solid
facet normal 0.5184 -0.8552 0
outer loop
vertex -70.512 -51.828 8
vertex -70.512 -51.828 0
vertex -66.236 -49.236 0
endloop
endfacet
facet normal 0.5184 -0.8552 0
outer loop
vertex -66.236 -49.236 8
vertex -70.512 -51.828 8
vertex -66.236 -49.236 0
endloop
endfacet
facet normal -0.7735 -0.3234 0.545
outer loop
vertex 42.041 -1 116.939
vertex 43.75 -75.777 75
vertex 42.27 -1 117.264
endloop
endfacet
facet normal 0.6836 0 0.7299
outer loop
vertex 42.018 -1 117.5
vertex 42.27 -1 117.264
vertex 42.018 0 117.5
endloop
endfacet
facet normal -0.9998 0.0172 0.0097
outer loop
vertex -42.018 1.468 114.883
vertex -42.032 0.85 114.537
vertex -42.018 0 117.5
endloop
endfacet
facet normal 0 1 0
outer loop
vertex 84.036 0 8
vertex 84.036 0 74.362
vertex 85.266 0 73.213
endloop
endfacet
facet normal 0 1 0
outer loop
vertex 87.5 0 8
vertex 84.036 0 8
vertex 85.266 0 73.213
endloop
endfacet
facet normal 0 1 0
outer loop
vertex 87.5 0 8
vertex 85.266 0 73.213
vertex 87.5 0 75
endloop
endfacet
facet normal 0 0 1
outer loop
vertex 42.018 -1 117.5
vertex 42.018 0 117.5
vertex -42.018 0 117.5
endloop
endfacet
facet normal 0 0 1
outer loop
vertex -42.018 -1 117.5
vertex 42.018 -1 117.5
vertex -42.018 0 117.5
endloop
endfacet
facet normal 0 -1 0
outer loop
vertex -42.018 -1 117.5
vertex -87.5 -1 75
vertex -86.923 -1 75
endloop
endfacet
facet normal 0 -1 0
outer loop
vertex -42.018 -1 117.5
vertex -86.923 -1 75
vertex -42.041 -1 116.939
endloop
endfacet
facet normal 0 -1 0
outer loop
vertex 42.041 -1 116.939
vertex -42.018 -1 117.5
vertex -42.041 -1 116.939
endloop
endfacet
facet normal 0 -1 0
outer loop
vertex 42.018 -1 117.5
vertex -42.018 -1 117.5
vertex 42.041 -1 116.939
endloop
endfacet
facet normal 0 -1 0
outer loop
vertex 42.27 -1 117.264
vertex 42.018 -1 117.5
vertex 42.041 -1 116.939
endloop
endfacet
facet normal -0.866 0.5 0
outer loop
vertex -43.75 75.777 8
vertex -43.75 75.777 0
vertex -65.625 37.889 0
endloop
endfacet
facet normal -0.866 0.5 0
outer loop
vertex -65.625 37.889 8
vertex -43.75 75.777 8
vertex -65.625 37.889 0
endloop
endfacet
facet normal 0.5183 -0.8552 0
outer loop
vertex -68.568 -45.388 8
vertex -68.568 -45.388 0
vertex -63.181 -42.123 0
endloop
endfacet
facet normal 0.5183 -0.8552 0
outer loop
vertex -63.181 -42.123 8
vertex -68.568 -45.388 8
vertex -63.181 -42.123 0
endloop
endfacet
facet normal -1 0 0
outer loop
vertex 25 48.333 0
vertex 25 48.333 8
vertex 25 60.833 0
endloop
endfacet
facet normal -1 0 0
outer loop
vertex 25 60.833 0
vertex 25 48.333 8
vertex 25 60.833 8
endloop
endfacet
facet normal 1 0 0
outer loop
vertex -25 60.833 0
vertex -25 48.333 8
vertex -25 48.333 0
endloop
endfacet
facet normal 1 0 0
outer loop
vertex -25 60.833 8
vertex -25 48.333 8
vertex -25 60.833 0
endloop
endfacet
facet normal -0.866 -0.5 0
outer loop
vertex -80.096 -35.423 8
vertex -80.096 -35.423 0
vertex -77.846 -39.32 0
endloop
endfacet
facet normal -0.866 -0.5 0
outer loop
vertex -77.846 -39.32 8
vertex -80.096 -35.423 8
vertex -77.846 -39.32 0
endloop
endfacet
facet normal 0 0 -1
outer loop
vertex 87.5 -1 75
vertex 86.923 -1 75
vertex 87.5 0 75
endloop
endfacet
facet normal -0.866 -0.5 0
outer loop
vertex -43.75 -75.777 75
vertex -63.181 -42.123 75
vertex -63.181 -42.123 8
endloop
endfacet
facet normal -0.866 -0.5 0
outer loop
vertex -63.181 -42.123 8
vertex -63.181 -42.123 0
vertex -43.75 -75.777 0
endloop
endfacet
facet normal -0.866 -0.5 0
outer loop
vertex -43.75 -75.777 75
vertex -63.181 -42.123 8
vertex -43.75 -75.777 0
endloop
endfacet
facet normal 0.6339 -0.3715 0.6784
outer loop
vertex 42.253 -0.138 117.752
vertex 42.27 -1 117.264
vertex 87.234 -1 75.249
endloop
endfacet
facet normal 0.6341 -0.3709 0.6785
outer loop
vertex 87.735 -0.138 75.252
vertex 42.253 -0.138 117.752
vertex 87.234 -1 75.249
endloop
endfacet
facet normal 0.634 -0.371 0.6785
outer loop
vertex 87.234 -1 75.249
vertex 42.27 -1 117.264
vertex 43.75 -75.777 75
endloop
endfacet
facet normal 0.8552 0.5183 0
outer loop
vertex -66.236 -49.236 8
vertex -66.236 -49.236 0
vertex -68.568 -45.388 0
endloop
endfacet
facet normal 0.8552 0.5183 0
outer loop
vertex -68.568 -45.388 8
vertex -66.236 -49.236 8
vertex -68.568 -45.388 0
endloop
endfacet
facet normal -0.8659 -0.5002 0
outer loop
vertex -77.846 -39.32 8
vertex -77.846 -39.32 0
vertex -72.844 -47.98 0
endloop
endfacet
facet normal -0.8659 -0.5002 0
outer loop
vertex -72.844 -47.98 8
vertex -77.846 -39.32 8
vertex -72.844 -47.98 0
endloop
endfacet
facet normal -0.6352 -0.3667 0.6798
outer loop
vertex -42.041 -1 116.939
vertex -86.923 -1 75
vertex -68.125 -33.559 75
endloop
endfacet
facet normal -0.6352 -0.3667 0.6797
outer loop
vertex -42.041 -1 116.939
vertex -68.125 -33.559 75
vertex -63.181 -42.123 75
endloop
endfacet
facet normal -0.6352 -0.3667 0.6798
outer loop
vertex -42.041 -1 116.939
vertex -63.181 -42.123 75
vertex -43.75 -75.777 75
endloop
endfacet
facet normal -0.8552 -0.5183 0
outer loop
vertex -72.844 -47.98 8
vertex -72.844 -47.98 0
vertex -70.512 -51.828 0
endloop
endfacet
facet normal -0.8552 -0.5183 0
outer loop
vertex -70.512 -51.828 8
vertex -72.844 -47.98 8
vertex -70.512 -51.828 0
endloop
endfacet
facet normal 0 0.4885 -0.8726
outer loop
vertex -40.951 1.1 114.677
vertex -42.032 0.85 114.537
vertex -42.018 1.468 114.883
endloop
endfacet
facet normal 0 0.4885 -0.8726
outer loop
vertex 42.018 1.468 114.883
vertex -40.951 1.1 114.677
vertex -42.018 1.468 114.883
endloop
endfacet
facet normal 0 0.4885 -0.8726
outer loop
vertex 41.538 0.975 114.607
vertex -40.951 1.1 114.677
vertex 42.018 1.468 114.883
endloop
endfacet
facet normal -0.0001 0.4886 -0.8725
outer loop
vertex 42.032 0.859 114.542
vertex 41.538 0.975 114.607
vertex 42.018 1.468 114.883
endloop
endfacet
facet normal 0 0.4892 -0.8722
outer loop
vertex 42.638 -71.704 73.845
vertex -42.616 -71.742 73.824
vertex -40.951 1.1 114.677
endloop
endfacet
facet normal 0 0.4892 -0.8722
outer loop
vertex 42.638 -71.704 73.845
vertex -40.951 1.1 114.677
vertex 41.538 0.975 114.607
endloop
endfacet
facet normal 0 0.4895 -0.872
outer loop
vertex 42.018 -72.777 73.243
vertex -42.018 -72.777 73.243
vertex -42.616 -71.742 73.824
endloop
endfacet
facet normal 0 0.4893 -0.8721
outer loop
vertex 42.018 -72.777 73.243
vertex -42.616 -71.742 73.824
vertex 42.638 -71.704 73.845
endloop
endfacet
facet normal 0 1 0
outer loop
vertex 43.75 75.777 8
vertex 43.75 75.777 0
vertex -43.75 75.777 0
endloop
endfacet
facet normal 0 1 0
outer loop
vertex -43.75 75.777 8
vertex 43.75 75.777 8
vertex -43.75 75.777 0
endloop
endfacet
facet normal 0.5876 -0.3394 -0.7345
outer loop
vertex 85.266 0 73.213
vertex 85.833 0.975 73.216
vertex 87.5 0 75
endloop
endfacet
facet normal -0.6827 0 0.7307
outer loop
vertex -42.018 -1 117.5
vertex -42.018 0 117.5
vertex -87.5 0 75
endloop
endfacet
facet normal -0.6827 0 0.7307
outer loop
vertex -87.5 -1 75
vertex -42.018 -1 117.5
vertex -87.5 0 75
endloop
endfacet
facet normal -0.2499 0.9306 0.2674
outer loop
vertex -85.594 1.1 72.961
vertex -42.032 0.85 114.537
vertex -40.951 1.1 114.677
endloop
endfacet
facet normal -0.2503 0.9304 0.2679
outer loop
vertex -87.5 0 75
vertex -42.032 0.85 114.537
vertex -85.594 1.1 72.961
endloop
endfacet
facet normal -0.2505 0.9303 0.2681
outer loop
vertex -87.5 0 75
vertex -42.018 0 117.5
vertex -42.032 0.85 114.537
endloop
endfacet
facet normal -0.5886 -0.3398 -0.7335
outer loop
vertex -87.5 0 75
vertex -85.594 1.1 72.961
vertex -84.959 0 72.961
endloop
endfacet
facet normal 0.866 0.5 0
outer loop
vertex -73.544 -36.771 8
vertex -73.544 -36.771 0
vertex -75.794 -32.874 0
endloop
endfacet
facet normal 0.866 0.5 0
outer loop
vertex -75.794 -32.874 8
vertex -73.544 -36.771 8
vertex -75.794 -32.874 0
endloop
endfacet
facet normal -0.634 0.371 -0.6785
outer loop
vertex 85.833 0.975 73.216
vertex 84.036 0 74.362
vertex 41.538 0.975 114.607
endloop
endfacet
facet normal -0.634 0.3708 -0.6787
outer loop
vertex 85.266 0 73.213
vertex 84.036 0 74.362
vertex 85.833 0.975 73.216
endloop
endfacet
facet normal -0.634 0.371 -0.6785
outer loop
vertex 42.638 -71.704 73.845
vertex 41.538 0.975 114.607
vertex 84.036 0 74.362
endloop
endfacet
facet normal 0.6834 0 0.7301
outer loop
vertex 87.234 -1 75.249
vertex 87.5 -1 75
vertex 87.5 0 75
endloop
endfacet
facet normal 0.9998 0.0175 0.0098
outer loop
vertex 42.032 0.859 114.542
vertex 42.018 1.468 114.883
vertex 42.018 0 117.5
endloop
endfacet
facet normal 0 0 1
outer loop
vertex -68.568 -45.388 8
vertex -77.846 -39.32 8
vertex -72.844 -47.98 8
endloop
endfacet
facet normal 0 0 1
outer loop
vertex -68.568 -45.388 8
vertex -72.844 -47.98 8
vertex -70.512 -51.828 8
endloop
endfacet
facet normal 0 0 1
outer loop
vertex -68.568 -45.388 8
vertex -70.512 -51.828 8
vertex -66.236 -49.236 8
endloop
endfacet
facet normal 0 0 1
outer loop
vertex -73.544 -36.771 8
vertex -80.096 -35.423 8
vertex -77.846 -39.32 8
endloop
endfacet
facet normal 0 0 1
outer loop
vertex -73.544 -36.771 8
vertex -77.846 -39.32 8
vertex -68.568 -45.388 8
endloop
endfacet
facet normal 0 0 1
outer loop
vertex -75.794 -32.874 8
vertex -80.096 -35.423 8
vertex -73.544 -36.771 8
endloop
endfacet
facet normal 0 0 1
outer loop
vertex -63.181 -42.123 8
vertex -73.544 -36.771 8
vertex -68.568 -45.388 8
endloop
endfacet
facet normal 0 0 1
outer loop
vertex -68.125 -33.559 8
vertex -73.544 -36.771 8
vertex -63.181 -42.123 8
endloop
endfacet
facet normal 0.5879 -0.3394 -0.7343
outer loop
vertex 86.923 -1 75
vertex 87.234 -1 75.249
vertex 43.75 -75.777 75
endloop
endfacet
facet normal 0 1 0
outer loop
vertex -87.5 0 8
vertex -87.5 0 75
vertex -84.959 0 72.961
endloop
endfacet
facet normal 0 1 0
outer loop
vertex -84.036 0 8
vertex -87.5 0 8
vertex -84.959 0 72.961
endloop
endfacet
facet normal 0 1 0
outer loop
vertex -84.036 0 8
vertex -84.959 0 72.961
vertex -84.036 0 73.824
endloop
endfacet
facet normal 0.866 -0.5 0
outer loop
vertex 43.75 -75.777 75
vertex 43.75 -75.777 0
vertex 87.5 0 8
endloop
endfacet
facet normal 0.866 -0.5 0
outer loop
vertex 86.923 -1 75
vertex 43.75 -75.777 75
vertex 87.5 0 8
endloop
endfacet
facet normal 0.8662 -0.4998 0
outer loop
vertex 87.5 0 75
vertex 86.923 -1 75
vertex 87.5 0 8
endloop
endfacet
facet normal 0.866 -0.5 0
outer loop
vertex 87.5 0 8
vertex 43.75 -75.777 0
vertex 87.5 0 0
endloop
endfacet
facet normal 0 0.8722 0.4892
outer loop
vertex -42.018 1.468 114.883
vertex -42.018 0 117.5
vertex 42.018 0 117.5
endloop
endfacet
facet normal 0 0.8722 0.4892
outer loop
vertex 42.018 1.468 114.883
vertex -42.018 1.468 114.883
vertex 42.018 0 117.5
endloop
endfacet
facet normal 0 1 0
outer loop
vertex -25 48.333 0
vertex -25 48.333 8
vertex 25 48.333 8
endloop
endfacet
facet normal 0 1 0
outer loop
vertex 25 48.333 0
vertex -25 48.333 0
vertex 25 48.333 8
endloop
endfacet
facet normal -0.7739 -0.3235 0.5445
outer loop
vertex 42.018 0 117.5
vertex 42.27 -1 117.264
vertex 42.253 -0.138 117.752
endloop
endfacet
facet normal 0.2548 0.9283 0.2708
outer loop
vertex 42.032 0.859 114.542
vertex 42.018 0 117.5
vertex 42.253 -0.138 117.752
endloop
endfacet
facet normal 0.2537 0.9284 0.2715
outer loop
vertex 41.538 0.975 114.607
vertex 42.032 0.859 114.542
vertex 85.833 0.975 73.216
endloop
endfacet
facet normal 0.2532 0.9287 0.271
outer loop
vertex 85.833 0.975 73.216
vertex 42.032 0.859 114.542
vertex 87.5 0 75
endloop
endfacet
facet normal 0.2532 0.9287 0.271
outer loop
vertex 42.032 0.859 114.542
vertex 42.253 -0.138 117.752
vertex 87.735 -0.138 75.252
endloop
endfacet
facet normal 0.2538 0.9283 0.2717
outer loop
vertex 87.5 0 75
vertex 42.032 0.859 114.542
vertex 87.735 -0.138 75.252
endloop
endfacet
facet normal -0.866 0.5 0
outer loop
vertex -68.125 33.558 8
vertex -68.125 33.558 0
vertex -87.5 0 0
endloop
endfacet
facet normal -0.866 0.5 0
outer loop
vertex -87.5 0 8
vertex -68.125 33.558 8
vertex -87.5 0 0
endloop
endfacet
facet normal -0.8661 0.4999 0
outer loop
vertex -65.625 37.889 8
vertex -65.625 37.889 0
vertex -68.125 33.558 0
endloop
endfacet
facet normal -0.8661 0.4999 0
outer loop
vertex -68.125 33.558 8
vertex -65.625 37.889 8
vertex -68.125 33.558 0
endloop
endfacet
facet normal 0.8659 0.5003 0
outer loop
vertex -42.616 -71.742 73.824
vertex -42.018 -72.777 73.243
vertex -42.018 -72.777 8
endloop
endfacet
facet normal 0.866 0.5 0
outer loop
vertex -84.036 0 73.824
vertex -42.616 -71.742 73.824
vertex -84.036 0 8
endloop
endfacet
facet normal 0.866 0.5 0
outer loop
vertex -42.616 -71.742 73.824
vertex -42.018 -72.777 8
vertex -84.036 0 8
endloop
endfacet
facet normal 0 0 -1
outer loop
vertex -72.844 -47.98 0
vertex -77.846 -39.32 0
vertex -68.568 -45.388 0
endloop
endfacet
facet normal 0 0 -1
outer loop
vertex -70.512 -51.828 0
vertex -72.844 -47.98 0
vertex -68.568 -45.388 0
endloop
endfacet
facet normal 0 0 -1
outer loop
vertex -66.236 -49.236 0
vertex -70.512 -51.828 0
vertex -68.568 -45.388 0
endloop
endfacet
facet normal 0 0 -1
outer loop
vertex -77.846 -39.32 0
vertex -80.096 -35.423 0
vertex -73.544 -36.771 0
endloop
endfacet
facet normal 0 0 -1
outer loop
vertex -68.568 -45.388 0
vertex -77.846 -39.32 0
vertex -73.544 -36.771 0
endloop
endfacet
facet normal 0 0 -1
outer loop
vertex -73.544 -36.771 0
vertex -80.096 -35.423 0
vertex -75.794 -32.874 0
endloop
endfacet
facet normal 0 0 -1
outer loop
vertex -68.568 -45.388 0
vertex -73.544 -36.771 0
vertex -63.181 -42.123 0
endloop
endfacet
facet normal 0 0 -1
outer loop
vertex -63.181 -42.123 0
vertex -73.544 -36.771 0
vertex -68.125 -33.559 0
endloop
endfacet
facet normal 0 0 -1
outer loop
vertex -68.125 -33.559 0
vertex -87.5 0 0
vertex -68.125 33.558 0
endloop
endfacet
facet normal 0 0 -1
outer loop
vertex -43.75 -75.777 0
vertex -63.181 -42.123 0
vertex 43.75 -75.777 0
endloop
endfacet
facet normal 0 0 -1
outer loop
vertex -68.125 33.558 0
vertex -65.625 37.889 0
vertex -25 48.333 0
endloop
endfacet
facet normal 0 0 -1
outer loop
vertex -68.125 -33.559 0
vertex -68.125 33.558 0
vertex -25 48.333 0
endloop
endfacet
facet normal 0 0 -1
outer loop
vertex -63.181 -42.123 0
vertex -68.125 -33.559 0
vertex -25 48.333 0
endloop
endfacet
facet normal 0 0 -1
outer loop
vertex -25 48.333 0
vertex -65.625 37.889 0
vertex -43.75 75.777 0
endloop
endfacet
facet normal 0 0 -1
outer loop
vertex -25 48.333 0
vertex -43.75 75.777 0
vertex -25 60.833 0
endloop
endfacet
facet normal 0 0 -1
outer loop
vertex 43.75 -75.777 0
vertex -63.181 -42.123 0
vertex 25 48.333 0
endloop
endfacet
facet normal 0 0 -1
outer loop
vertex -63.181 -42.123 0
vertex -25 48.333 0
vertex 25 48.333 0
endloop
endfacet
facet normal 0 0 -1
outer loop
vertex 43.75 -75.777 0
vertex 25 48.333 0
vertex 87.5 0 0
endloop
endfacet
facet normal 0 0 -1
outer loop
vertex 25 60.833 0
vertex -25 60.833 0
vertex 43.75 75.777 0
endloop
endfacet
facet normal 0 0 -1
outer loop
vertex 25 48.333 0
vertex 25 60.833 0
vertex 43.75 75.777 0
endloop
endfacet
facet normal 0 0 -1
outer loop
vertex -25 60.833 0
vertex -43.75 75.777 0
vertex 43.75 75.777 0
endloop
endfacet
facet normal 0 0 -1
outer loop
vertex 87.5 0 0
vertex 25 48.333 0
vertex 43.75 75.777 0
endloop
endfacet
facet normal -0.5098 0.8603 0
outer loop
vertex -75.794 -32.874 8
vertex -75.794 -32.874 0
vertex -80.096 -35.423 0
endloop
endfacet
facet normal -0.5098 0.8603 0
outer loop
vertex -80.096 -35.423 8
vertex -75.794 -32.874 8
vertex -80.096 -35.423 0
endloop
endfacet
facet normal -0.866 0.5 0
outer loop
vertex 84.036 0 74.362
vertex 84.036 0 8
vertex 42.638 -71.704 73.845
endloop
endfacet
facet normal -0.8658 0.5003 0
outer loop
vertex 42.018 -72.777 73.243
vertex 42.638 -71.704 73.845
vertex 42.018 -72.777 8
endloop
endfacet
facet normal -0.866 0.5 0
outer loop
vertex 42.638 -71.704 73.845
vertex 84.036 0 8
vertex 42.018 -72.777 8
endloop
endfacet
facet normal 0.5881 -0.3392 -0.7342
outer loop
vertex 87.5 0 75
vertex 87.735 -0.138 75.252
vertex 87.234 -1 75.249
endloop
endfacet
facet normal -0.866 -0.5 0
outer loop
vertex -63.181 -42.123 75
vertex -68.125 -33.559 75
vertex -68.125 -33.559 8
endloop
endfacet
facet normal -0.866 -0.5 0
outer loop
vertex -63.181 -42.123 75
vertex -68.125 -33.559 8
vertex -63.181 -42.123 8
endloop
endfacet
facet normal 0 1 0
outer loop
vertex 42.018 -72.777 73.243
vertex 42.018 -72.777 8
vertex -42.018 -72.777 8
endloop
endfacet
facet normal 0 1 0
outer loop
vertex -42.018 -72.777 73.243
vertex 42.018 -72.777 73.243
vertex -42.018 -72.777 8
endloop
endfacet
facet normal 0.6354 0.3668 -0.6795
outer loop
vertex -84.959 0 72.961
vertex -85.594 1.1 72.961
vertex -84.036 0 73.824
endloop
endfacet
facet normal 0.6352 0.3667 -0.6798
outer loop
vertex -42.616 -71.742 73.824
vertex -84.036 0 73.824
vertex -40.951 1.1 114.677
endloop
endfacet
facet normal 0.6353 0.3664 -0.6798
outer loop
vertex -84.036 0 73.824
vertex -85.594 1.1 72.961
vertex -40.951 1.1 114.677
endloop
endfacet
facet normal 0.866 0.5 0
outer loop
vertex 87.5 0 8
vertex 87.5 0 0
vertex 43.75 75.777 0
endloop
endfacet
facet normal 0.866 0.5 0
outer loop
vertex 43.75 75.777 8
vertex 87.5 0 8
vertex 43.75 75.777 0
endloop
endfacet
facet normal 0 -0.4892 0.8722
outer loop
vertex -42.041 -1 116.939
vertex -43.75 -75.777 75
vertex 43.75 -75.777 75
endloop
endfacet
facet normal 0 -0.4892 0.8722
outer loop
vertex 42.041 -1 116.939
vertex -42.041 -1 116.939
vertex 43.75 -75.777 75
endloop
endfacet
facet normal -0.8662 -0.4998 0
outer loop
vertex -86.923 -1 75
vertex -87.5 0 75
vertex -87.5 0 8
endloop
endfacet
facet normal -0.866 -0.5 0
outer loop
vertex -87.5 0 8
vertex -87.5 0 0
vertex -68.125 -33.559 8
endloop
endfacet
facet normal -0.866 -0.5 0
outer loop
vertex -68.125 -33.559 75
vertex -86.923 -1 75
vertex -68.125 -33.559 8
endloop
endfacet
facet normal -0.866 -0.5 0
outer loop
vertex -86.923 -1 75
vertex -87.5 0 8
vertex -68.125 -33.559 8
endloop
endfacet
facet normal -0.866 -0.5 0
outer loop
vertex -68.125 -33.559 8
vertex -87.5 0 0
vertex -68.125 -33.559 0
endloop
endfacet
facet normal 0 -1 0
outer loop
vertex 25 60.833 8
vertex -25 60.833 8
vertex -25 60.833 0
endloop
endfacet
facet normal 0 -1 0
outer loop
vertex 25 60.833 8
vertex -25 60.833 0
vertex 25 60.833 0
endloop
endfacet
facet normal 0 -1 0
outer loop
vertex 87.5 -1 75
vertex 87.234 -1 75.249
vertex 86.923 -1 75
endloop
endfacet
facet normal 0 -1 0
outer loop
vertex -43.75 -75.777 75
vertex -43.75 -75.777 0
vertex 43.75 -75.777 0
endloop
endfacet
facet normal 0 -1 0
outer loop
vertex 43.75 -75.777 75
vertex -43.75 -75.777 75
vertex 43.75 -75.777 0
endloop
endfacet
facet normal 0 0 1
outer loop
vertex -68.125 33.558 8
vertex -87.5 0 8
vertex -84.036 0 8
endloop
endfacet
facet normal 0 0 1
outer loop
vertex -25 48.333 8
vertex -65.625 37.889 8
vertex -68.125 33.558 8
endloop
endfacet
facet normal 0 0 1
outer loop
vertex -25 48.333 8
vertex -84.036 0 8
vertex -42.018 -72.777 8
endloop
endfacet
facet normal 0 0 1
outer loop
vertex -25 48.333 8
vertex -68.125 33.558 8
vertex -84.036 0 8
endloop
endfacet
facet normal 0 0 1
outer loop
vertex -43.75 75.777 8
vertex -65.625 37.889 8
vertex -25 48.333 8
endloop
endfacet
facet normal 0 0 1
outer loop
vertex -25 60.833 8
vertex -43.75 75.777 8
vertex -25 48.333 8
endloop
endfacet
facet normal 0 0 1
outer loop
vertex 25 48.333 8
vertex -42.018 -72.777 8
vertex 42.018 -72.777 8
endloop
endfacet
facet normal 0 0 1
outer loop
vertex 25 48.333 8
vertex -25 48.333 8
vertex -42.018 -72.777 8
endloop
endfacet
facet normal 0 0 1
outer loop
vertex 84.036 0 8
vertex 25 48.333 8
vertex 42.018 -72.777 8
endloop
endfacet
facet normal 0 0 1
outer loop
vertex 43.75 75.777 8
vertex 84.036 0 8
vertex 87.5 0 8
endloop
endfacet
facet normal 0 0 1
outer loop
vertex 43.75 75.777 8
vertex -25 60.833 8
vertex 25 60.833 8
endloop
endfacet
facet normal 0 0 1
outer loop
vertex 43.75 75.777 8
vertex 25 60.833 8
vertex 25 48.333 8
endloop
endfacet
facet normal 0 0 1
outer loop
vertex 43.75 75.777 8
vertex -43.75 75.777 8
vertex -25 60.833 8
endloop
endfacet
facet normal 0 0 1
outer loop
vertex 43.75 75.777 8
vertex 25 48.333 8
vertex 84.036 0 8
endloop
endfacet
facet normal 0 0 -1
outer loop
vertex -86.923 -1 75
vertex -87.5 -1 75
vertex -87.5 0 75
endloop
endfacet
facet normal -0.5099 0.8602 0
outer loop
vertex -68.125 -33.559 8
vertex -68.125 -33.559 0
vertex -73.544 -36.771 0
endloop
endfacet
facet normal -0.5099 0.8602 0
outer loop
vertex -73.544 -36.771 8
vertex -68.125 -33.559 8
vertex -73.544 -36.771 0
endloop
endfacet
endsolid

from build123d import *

# Parameters (mm, degrees)
F0_W      = 50
F0_H      = 12.5
F1_DEPTH  = 8
F2_DEPTH  = 75
F4_DEPTH  = 8
F7_DEPTH  = 3
F8_DEPTH  = 1
F11_DEPTH = 3
F14_DEPTH = 3
F15_DEPTH = 8
F16_DEPTH = 8
F17_DEPTH = 12.5


# Not quite as in the source:
# - a feature names something its author has since deleted; it is built from what else it names


with BuildPart() as f1:
    # F0 (on Top) → F1 (new body)
    with BuildSketch(Plane.XY):
        Polygon((42.0179491924, -72.7772228311), (84.0358983849, 0), (42.0179491924, 72.7772228311), (-42.0179491924, 72.7772228311), (-84.0358983849, 0), (-42.0179491924, -72.7772228311), align=None)
        with Locations((0, 54.5829171234)):
            Rectangle(F0_W, F0_H, mode=Mode.SUBTRACT)
    extrude(amount=F1_DEPTH)

    # F0 (on Top) → F2 (join)
    with BuildSketch(Plane.XY):
        Polygon((43.75, -75.7772228311), (87.5, 0), (84.0358983849, 0), (42.0179491924, -72.7772228311), (-42.0179491924, -72.7772228311), (-84.0358983849, 0), (-87.5, 0), (-68.1246734519, -33.5590499945), (-63.1805508476, -42.1225215441), (-43.75, -75.7772228311), align=None)
    extrude(amount=F2_DEPTH)

    # F0 (on Top) → F4 (join)
    with BuildSketch(Plane.XY):
        Polygon((43.75, 75.7772228311), (-43.75, 75.7772228311), (-65.625, 37.8886114156), (-68.125, 33.5584843966), (-87.5, 0), (-84.0358983849, 0), (-42.0179491924, 72.7772228311), (42.0179491924, 72.7772228311), (84.0358983849, 0), (87.5, 0), align=None)
    extrude(amount=F4_DEPTH)

    # F6 (on face) → F7 (join)
    with BuildSketch(Plane(origin=(0, -50.1312366318, 89.3836679776), x_dir=(1, 0, 0), z_dir=(0, 0.4891706574, -0.872188092))):
        Polygon((43.75, 29.4041920927), (0, 29.4041920927), (-43.75, 29.4041920927), (-42.01795, -57.4775522498), (42.01795, -57.4775522498), align=None)
    extrude(amount=F7_DEPTH)

    # F3 (on Front) → F8 (join)
    with BuildSketch(Plane.XZ):
        Polygon((-42.01795, 114.5), (0, 114.5), (42.01795, 114.5), (84.0359, 75), (87.5, 75), (42.01795, 117.5), (0, 117.5), (-42.01795, 117.5), (-87.5, 75), (-84.0359, 75), align=None)
    extrude(amount=F8_DEPTH)

    # F10 (on face) → F11 (join)
    with BuildSketch(Plane(origin=(-67.6846727043, -39.0777640058, 72.4338274863), x_dir=(0.7723629594, -0.3015876344, 0.5590173143), z_dir=(-0.6351814378, -0.3667221741, 0.6797495039))):
        Polygon((33.2314262259, 55.789645187), (-25.6554603702, 35.6104118215), (30.9888924807, -31.0804218073), align=None)
    extrude(amount=-F11_DEPTH)

    # F13 (on face) → F14 (join)
    with BuildSketch(Plane(origin=(67.6756688636, -39.5950852503, 72.4241918832), x_dir=(0.7733047167, 0.3041472681, -0.556322078), z_dir=(-0.6340345536, 0.3709553614, -0.6785221475))):
        Polygon((-30.939509805, 30.5117392321), (-32.8751652468, -56.3649154418), (25.9400068576, -35.9776056011), align=None)
    extrude(amount=F14_DEPTH)

    # F0 (on Top) → F15 (join)
    with BuildSketch(Plane.XY):
        with Locations((0, 54.5829171234)):
            Rectangle(F0_W, F0_H)
    extrude(amount=F15_DEPTH)

    # F0 (on Top) → F16 (join)
    with BuildSketch(Plane.XY):
        Polygon((-77.8456263738, -39.3203930924), (-73.5443197712, -36.7711262349), (-75.7943197712, -32.8740119179), (-80.0956263738, -35.4232787754), align=None)
        Polygon((-63.1805508476, -42.1225215441), (-68.1246734519, -33.5590499945), (-73.5443197712, -36.7711262349), (-77.8456263738, -39.3203930924), (-72.8440428469, -47.9797326875), (-68.5681614313, -45.3880463409), align=None)
        Polygon((-66.2356437193, -49.236339615), (-68.5681614313, -45.3880463409), (-72.8440428469, -47.9797326875), (-70.5115251349, -51.8280259616), align=None)
    extrude(amount=F16_DEPTH)

    # F0 (on Top) → F17 (cut, symmetric)
    with BuildSketch(Plane.XY):
        with Locations((0, 54.5829171234)):
            Rectangle(F0_W, F0_H)
    extrude(amount=F17_DEPTH, both=True, mode=Mode.SUBTRACT)


solid = f1.part
